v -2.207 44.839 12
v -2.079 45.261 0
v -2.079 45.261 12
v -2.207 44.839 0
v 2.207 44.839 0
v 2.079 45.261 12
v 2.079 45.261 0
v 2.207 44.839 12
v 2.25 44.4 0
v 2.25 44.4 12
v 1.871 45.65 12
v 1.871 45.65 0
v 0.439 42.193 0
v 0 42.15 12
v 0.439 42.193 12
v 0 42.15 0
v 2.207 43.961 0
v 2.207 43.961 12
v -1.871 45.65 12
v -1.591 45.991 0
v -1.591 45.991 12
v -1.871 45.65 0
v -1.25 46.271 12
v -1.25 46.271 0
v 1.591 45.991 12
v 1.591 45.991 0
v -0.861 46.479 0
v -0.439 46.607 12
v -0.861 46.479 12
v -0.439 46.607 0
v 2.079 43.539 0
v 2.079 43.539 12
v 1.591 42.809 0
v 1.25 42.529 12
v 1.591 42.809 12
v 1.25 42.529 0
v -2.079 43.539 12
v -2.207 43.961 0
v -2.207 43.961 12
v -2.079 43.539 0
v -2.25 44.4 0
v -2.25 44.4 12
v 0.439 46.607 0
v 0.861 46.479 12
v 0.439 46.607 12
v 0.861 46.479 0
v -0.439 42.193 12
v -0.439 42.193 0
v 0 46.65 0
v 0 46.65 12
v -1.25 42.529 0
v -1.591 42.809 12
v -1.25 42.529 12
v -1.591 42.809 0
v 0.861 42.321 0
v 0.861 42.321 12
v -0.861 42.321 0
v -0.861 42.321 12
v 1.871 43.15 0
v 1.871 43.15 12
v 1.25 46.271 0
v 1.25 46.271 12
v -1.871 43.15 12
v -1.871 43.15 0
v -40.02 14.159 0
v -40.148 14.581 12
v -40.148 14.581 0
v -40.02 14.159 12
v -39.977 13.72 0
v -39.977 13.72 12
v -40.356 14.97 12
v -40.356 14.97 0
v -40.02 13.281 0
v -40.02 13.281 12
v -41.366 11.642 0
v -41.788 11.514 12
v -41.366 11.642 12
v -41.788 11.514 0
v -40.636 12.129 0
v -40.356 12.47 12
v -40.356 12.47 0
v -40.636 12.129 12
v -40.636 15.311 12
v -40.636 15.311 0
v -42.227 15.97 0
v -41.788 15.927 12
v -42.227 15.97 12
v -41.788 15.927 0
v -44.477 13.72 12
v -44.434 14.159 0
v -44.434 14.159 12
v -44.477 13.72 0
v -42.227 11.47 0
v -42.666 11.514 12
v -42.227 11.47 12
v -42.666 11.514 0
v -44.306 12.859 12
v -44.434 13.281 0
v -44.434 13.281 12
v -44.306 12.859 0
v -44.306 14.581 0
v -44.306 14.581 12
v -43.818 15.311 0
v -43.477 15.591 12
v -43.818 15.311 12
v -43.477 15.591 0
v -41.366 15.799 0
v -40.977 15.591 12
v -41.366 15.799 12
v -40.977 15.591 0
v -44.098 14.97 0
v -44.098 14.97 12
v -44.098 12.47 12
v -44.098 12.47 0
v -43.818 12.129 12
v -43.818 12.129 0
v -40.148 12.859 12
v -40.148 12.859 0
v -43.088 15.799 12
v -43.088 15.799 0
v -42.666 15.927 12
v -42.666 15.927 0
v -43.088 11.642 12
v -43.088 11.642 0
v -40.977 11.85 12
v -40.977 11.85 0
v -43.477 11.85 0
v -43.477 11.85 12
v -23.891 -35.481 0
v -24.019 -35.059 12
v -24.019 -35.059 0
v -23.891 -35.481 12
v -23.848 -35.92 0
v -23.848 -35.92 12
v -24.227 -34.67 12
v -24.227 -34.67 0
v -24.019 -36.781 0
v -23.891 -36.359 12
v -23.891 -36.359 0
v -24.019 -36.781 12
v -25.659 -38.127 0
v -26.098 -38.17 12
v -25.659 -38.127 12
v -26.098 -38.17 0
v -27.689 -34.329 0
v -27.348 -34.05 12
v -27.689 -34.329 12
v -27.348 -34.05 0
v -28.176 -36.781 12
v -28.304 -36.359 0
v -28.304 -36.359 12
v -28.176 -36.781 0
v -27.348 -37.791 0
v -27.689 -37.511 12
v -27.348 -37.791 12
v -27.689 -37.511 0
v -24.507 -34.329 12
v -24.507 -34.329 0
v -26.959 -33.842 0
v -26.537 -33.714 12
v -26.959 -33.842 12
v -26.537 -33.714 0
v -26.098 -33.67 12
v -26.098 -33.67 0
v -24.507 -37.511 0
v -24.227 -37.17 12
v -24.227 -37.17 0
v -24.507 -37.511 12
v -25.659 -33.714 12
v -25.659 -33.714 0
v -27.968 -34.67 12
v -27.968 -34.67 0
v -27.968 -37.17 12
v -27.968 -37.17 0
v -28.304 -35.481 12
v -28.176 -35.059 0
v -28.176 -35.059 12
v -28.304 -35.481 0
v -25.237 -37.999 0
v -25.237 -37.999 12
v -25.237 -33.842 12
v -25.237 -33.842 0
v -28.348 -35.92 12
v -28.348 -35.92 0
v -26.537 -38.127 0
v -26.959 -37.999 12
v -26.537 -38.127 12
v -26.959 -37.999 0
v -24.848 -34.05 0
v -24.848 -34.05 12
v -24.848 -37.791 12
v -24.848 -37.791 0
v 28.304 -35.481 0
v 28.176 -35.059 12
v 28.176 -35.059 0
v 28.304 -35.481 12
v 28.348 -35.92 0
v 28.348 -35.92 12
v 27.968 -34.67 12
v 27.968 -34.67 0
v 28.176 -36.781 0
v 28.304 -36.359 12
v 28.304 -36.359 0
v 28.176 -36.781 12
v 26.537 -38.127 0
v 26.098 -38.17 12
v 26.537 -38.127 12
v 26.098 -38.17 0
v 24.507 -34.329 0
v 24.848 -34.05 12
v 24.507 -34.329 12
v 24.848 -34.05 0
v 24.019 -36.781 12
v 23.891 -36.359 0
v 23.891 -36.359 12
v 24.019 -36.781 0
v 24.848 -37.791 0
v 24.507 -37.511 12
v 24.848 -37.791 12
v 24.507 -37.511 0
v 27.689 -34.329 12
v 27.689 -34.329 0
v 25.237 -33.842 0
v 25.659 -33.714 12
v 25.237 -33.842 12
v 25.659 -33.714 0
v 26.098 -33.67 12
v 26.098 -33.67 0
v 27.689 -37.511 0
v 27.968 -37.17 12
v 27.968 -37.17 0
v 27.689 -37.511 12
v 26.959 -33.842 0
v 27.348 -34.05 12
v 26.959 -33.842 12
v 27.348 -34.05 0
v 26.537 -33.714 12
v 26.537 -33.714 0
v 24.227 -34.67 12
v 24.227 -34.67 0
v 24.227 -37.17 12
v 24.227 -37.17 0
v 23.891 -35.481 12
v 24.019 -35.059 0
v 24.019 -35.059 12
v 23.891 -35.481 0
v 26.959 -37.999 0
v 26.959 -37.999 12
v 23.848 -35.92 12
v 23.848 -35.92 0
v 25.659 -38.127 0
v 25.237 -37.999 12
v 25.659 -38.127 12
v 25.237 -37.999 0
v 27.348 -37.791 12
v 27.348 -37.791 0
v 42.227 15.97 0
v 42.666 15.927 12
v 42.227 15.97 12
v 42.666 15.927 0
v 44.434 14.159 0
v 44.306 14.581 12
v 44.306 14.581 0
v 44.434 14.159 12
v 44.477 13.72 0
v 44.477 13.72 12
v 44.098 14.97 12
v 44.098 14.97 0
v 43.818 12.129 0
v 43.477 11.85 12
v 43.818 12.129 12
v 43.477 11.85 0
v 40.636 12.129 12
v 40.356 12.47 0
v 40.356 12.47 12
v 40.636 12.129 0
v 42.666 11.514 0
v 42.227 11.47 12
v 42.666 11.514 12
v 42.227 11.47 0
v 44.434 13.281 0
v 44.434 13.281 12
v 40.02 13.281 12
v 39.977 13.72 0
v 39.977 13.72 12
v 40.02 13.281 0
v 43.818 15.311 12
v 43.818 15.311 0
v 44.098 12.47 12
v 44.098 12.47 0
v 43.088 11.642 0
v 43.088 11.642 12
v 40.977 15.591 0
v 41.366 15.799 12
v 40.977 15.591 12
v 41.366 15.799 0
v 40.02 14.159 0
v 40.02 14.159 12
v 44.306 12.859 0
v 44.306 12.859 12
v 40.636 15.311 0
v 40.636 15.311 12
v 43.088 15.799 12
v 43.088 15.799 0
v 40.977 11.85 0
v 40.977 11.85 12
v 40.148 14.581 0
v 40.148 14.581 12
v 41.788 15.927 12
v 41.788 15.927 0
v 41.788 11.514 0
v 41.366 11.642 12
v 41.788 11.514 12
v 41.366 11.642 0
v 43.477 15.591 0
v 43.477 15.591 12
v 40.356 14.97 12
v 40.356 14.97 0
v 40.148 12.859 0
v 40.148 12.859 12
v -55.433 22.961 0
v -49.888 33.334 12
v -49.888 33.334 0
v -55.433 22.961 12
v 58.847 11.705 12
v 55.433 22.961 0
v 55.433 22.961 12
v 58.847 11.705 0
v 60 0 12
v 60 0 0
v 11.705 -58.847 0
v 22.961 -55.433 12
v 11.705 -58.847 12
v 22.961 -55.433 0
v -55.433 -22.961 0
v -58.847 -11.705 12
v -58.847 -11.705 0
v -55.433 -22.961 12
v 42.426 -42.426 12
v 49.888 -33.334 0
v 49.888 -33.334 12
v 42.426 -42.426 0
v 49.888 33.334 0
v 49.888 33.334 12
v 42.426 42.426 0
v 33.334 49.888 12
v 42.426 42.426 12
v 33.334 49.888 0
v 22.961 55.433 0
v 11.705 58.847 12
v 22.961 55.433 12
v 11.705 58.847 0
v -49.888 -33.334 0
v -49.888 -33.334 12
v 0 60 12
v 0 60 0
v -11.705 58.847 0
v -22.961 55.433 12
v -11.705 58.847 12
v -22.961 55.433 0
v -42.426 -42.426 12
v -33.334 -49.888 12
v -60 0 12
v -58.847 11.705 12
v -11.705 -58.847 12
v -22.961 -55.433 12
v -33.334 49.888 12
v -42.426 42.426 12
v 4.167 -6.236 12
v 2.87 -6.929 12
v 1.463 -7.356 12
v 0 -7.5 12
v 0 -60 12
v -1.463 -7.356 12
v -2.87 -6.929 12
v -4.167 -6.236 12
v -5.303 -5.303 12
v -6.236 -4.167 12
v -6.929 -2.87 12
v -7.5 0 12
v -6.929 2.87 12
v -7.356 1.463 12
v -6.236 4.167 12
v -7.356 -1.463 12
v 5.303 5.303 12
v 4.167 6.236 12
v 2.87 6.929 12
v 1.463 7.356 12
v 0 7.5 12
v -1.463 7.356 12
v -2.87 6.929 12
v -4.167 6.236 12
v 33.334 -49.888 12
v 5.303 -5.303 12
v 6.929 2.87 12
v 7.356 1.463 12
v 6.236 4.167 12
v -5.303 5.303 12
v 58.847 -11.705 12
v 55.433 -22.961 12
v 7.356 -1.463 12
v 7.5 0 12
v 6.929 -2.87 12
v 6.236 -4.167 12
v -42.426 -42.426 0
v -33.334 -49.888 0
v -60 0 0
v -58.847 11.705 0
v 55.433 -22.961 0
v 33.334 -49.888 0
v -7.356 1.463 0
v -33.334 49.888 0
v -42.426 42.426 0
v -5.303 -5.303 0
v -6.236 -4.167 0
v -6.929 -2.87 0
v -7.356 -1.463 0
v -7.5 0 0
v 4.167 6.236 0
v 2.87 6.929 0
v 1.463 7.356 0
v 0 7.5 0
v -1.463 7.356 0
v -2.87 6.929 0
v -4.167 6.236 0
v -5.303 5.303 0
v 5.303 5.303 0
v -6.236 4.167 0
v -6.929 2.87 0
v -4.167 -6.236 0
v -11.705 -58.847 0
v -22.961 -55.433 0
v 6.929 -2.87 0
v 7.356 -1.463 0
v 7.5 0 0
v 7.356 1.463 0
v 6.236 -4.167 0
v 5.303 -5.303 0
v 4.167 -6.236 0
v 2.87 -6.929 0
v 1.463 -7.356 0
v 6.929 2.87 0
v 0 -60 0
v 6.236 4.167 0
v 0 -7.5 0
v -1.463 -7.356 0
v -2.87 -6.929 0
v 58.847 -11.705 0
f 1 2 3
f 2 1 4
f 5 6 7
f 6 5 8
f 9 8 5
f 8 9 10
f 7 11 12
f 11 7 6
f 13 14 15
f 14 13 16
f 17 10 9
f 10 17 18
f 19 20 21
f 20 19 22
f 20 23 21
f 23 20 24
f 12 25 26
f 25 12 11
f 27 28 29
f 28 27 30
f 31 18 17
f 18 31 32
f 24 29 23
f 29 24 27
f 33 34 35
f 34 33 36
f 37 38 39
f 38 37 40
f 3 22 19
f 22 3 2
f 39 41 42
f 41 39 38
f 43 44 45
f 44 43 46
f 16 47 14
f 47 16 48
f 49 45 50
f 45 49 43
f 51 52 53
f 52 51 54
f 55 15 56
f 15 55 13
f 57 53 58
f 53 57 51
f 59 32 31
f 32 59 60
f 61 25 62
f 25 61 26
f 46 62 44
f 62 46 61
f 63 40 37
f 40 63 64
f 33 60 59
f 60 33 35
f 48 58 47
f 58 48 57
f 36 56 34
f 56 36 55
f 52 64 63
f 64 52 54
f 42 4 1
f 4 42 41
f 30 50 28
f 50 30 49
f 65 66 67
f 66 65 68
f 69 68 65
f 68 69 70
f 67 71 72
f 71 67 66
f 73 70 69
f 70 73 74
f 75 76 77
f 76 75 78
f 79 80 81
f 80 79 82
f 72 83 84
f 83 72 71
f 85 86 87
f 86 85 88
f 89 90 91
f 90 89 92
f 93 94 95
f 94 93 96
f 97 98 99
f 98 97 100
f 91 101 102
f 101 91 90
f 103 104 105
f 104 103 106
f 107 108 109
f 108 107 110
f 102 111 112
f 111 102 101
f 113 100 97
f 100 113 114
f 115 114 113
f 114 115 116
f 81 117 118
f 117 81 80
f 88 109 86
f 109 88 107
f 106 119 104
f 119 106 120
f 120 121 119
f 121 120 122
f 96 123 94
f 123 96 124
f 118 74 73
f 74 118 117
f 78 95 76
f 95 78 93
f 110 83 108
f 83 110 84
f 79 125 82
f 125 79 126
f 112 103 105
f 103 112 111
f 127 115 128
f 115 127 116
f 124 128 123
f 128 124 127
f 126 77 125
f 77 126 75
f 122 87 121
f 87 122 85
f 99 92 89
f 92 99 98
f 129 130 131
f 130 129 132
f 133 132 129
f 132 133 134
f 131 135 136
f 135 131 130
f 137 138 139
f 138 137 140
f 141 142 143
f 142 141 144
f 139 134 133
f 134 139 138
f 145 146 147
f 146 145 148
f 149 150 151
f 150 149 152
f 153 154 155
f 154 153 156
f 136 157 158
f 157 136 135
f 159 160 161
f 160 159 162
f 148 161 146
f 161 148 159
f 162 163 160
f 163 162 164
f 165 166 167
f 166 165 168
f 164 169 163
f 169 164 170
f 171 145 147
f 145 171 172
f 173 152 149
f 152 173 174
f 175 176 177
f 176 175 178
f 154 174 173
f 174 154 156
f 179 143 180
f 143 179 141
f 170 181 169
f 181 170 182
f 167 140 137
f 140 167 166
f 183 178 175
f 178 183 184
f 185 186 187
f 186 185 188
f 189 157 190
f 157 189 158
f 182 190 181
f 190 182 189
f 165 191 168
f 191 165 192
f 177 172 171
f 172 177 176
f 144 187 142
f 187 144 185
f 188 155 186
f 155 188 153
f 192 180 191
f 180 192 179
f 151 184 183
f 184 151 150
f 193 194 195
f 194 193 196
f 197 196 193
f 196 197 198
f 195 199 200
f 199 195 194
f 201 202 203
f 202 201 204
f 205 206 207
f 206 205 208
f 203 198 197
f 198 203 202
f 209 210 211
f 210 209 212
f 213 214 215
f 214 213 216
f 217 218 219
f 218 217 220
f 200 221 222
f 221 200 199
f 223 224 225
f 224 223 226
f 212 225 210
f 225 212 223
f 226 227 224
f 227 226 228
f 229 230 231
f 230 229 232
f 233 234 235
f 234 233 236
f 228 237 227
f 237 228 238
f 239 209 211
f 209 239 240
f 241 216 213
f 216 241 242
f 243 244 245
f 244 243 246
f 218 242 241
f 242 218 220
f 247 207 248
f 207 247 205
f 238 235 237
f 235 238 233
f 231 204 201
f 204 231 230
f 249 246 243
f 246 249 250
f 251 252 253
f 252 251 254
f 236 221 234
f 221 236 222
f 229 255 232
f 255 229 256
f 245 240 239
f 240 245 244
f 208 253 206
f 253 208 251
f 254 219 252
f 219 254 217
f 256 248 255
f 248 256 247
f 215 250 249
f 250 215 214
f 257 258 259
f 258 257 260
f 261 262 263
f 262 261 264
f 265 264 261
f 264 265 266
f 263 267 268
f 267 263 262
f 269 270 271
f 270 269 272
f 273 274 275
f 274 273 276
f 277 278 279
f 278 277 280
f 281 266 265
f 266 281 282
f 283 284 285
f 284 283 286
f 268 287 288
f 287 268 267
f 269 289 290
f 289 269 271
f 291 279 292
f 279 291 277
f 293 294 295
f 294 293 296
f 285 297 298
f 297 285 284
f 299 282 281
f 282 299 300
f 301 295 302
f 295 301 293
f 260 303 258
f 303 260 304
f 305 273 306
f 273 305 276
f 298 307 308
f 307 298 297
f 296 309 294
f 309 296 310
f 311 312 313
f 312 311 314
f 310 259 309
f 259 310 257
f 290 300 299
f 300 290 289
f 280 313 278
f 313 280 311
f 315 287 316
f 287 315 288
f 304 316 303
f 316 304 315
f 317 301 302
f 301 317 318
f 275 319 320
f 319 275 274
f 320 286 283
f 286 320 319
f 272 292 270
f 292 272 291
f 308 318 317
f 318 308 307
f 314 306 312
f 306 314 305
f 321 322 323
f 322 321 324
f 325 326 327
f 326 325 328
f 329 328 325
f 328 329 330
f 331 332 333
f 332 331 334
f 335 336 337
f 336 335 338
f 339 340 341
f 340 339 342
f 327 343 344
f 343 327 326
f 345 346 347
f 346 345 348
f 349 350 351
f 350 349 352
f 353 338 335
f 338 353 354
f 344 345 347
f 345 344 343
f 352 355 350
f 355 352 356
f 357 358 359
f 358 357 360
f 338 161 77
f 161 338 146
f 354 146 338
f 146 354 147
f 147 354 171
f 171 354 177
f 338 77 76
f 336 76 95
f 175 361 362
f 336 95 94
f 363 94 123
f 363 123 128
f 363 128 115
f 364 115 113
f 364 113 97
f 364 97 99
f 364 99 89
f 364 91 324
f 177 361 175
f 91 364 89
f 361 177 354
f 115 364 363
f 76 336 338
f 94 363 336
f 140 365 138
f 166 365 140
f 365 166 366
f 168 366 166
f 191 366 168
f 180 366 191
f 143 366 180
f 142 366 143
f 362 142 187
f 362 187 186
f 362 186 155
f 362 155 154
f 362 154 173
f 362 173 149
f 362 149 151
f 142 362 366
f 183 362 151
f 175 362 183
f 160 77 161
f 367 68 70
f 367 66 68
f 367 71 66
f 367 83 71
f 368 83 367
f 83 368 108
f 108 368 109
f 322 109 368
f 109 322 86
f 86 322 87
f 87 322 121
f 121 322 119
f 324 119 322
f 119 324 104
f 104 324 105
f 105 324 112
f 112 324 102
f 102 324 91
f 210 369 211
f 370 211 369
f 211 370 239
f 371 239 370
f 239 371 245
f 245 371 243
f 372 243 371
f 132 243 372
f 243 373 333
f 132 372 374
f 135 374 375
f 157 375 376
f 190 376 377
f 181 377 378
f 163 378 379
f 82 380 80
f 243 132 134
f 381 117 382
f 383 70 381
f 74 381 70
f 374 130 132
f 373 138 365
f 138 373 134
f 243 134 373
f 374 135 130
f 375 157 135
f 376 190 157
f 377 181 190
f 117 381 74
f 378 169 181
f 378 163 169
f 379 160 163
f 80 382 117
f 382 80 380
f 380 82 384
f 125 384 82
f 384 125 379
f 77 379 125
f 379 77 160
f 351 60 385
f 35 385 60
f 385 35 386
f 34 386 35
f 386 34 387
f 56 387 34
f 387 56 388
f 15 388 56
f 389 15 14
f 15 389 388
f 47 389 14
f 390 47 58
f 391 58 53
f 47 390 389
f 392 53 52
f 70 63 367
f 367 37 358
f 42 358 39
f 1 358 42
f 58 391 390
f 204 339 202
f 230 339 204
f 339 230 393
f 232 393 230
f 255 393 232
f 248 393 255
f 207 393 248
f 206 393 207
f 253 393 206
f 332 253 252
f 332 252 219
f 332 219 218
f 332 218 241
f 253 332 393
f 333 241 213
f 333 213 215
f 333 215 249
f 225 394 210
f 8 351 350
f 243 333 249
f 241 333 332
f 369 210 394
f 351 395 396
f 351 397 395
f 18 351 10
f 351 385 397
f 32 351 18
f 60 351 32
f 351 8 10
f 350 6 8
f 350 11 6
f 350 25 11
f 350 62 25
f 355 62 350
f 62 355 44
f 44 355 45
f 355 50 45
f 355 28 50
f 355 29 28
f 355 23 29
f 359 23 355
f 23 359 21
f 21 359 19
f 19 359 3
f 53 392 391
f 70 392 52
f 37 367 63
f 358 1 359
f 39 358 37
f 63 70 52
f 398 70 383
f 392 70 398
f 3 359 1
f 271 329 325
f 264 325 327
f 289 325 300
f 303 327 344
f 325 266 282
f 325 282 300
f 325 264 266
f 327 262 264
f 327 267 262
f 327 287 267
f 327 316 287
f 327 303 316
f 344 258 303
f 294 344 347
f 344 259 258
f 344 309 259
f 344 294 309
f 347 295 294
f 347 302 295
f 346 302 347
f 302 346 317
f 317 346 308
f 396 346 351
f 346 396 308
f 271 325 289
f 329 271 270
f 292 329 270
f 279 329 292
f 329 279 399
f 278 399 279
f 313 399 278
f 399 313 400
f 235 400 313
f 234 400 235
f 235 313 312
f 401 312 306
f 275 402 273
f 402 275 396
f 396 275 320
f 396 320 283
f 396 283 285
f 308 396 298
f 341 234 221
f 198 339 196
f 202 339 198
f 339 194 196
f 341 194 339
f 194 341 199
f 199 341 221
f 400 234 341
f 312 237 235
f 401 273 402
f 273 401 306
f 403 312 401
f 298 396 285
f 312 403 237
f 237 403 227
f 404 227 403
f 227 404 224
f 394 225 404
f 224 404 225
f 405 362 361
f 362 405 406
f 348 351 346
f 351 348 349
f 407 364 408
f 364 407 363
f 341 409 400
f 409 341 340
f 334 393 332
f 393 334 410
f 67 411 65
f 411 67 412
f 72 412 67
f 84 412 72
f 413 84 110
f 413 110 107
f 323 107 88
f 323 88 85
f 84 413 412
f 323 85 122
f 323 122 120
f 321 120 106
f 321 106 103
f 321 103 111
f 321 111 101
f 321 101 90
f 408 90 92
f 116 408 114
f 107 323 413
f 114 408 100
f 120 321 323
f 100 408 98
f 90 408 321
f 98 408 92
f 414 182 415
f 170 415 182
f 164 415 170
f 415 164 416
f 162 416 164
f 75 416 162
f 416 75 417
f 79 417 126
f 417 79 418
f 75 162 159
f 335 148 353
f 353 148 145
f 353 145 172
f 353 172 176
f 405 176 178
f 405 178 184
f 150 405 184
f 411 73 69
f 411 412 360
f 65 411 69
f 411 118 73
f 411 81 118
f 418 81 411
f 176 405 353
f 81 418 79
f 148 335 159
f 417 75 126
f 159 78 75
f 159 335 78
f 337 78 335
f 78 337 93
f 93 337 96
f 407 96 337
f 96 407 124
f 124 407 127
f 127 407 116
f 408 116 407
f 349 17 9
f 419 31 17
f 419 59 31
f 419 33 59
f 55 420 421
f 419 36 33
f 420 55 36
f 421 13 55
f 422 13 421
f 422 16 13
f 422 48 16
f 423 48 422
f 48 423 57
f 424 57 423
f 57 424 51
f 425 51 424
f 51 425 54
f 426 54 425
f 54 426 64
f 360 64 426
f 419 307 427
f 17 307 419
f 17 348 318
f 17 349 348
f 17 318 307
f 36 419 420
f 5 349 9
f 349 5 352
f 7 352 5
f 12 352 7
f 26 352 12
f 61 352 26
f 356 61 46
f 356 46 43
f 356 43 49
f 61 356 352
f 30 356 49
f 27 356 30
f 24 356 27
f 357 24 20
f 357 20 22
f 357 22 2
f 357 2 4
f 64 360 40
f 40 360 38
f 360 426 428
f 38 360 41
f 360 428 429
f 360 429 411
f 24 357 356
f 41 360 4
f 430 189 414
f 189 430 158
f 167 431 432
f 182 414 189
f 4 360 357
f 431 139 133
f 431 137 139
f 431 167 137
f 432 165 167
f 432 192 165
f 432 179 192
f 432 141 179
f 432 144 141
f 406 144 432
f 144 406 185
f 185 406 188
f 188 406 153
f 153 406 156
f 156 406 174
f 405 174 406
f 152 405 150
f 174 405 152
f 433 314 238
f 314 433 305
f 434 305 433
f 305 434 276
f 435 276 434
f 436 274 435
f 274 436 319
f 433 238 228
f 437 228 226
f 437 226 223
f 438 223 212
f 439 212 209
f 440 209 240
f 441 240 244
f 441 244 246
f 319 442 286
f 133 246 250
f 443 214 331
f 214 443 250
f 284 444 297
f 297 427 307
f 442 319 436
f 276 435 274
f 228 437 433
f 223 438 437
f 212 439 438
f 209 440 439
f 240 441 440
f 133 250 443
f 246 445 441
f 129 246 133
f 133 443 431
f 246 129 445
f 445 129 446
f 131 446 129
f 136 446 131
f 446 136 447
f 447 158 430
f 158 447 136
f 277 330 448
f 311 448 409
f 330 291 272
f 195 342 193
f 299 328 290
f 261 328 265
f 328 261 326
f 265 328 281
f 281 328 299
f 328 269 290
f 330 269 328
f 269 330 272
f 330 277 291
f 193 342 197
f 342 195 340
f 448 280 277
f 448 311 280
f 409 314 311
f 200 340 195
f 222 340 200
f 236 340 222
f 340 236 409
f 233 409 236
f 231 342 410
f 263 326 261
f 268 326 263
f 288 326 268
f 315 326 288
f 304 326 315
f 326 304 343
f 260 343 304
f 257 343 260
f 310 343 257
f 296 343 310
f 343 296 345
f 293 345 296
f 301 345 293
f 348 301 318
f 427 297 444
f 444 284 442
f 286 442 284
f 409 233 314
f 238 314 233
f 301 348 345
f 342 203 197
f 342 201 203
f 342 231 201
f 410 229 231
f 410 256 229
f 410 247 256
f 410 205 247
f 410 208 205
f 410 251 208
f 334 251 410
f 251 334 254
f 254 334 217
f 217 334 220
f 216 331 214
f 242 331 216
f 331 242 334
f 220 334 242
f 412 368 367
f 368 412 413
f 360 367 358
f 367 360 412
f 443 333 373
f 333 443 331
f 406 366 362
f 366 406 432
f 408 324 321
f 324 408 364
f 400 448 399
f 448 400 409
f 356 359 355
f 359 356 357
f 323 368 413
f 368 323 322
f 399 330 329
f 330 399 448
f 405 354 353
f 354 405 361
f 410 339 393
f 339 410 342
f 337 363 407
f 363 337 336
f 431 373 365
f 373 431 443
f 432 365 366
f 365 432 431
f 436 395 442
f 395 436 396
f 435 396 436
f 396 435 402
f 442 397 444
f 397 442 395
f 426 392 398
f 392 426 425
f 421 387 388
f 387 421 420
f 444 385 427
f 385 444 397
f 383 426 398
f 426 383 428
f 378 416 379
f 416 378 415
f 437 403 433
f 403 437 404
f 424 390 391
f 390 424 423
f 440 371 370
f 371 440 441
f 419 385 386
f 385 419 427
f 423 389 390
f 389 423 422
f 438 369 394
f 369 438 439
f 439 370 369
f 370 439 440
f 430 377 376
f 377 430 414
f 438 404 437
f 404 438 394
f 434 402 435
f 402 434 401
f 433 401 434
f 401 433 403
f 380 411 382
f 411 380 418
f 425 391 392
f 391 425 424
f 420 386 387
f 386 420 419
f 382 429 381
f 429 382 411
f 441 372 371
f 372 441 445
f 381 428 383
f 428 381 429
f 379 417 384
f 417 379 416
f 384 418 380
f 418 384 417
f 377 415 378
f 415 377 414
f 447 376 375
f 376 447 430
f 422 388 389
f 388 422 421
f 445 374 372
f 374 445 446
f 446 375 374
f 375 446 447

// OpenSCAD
$fn = 32;

// ----------------------------------------------------------------------
// Flange Ø120 x 12
// 5 holes on a Ø88.8 bolt circle, bolted joints
// ----------------------------------------------------------------------

// --- parameters (mm) ---
flange_d = 120;  // outside diameter of the flange
thickness = 12;  // flange thickness
holes = 5;       // number of bolt holes
pcd = 88.8;      // bolt circle diameter
start_deg = 90;  // angle of the first hole, from +X
hole_d = 4.5;    // bolt hole diameter
bore_d = 15;     // central through bore
hub_d = 27;      // hub outside diameter
hub_h = 0;       // hub height above the flange face (0 = no hub)

// --- derived feature positions (mm) ---
height = thickness + hub_h;  // = 12   overall height of the part
pcd_r = pcd / 2;             // = 44.4   bolt circle radius
hole_step = 360 / holes;     // = 72   angular pitch
feature_centers = [
  [pcd_r * cos(start_deg + 0 * hole_step), pcd_r * sin(start_deg + 0 * hole_step)],
  [pcd_r * cos(start_deg + 1 * hole_step), pcd_r * sin(start_deg + 1 * hole_step)],
  [pcd_r * cos(start_deg + 2 * hole_step), pcd_r * sin(start_deg + 2 * hole_step)],
  [pcd_r * cos(start_deg + 3 * hole_step), pcd_r * sin(start_deg + 3 * hole_step)],
  [pcd_r * cos(start_deg + 4 * hole_step), pcd_r * sin(start_deg + 4 * hole_step)]
];   // bolt hole centres on the pitch circle

// flange disc, every hole and the bore cut straight through
difference() {
  union() {
    cylinder(d = flange_d, h = thickness);
  }
  translate([0, 0, -1]) cylinder(d = bore_d, h = height + 2);  // bore, through
  for (centre = feature_centers)
    translate([centre[0], centre[1], -1]) cylinder(d = hole_d, h = thickness + 2);
}
